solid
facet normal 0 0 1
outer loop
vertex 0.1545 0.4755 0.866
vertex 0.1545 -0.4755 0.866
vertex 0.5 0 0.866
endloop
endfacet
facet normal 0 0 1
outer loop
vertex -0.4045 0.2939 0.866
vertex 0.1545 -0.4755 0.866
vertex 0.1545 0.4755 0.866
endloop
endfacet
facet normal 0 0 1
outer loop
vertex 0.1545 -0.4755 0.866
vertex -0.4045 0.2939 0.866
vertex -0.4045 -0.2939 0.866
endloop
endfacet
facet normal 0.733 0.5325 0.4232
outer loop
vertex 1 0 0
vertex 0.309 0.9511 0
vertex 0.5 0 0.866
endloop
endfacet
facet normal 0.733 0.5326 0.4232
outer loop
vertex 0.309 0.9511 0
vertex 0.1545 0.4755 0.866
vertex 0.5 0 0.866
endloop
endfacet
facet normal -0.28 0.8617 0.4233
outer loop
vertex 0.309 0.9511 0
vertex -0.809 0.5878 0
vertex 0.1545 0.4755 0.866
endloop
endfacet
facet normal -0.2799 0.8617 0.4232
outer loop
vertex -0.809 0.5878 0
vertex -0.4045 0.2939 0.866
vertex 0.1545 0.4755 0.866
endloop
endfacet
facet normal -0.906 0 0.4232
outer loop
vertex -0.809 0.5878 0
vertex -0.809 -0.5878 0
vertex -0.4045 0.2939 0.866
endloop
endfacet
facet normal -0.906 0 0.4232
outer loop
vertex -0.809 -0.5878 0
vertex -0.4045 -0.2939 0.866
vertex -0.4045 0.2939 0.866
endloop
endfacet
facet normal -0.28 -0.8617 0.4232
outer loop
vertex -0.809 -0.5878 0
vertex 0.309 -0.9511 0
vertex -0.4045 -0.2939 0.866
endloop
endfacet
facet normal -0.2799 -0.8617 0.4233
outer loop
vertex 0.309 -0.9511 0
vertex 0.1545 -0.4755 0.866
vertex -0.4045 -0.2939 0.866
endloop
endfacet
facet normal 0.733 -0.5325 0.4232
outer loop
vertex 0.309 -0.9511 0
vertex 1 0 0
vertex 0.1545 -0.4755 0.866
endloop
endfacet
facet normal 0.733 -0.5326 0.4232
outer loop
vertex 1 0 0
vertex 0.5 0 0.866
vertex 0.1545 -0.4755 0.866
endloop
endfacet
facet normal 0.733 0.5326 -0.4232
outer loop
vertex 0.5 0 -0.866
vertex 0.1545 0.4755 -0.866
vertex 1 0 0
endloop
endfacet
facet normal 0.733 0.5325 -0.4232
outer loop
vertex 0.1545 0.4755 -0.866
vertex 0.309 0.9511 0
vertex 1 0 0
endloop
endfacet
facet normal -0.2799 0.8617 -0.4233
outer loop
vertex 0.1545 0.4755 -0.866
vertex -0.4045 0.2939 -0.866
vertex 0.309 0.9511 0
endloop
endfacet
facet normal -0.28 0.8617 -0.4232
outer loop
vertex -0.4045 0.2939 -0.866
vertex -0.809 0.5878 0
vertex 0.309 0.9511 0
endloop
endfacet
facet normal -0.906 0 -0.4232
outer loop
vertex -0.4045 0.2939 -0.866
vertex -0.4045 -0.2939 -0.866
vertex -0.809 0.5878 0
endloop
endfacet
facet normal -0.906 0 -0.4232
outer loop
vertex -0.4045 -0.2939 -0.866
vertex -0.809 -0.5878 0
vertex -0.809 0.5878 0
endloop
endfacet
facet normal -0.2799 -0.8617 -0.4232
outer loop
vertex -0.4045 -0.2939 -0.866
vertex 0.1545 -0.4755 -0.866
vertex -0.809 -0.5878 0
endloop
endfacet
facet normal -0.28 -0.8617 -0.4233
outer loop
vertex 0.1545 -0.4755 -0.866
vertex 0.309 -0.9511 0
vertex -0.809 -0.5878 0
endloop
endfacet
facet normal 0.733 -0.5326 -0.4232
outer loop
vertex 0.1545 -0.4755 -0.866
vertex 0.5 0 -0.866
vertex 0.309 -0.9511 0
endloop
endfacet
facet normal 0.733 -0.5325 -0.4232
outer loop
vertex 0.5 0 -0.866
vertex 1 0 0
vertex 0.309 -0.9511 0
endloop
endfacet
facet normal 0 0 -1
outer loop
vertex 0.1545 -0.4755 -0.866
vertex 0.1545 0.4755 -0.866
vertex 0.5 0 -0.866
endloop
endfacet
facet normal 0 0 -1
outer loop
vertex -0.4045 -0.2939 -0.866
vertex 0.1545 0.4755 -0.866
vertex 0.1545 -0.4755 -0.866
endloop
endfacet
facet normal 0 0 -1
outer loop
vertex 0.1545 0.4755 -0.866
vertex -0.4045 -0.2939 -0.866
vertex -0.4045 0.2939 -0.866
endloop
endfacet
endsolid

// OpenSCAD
// Copied from https://en.wikibooks.org/wiki/OpenSCAD_User_Manual/Customizer

//Text box for vector with more than 4 elements
Vector6=[12,34,44,43,23,23];

// Text box for string - this text should not appear in the customizer, because of the duplication
String="hello";

// Text box for string with length 8
String="length"; //8

function abc(a, b) = [a, b, 0];

AnotherStringWhichShouldNotEndUpInTheCustomizer = "hello";


module xyz(xyz=[0,0,0], size=1, color="red") {
    translate(xyz)
    color(color)
    sphere(size);
}

YetAnotherStringWhichShouldNotEndUpInTheCustomizer="hello";

xyz();
